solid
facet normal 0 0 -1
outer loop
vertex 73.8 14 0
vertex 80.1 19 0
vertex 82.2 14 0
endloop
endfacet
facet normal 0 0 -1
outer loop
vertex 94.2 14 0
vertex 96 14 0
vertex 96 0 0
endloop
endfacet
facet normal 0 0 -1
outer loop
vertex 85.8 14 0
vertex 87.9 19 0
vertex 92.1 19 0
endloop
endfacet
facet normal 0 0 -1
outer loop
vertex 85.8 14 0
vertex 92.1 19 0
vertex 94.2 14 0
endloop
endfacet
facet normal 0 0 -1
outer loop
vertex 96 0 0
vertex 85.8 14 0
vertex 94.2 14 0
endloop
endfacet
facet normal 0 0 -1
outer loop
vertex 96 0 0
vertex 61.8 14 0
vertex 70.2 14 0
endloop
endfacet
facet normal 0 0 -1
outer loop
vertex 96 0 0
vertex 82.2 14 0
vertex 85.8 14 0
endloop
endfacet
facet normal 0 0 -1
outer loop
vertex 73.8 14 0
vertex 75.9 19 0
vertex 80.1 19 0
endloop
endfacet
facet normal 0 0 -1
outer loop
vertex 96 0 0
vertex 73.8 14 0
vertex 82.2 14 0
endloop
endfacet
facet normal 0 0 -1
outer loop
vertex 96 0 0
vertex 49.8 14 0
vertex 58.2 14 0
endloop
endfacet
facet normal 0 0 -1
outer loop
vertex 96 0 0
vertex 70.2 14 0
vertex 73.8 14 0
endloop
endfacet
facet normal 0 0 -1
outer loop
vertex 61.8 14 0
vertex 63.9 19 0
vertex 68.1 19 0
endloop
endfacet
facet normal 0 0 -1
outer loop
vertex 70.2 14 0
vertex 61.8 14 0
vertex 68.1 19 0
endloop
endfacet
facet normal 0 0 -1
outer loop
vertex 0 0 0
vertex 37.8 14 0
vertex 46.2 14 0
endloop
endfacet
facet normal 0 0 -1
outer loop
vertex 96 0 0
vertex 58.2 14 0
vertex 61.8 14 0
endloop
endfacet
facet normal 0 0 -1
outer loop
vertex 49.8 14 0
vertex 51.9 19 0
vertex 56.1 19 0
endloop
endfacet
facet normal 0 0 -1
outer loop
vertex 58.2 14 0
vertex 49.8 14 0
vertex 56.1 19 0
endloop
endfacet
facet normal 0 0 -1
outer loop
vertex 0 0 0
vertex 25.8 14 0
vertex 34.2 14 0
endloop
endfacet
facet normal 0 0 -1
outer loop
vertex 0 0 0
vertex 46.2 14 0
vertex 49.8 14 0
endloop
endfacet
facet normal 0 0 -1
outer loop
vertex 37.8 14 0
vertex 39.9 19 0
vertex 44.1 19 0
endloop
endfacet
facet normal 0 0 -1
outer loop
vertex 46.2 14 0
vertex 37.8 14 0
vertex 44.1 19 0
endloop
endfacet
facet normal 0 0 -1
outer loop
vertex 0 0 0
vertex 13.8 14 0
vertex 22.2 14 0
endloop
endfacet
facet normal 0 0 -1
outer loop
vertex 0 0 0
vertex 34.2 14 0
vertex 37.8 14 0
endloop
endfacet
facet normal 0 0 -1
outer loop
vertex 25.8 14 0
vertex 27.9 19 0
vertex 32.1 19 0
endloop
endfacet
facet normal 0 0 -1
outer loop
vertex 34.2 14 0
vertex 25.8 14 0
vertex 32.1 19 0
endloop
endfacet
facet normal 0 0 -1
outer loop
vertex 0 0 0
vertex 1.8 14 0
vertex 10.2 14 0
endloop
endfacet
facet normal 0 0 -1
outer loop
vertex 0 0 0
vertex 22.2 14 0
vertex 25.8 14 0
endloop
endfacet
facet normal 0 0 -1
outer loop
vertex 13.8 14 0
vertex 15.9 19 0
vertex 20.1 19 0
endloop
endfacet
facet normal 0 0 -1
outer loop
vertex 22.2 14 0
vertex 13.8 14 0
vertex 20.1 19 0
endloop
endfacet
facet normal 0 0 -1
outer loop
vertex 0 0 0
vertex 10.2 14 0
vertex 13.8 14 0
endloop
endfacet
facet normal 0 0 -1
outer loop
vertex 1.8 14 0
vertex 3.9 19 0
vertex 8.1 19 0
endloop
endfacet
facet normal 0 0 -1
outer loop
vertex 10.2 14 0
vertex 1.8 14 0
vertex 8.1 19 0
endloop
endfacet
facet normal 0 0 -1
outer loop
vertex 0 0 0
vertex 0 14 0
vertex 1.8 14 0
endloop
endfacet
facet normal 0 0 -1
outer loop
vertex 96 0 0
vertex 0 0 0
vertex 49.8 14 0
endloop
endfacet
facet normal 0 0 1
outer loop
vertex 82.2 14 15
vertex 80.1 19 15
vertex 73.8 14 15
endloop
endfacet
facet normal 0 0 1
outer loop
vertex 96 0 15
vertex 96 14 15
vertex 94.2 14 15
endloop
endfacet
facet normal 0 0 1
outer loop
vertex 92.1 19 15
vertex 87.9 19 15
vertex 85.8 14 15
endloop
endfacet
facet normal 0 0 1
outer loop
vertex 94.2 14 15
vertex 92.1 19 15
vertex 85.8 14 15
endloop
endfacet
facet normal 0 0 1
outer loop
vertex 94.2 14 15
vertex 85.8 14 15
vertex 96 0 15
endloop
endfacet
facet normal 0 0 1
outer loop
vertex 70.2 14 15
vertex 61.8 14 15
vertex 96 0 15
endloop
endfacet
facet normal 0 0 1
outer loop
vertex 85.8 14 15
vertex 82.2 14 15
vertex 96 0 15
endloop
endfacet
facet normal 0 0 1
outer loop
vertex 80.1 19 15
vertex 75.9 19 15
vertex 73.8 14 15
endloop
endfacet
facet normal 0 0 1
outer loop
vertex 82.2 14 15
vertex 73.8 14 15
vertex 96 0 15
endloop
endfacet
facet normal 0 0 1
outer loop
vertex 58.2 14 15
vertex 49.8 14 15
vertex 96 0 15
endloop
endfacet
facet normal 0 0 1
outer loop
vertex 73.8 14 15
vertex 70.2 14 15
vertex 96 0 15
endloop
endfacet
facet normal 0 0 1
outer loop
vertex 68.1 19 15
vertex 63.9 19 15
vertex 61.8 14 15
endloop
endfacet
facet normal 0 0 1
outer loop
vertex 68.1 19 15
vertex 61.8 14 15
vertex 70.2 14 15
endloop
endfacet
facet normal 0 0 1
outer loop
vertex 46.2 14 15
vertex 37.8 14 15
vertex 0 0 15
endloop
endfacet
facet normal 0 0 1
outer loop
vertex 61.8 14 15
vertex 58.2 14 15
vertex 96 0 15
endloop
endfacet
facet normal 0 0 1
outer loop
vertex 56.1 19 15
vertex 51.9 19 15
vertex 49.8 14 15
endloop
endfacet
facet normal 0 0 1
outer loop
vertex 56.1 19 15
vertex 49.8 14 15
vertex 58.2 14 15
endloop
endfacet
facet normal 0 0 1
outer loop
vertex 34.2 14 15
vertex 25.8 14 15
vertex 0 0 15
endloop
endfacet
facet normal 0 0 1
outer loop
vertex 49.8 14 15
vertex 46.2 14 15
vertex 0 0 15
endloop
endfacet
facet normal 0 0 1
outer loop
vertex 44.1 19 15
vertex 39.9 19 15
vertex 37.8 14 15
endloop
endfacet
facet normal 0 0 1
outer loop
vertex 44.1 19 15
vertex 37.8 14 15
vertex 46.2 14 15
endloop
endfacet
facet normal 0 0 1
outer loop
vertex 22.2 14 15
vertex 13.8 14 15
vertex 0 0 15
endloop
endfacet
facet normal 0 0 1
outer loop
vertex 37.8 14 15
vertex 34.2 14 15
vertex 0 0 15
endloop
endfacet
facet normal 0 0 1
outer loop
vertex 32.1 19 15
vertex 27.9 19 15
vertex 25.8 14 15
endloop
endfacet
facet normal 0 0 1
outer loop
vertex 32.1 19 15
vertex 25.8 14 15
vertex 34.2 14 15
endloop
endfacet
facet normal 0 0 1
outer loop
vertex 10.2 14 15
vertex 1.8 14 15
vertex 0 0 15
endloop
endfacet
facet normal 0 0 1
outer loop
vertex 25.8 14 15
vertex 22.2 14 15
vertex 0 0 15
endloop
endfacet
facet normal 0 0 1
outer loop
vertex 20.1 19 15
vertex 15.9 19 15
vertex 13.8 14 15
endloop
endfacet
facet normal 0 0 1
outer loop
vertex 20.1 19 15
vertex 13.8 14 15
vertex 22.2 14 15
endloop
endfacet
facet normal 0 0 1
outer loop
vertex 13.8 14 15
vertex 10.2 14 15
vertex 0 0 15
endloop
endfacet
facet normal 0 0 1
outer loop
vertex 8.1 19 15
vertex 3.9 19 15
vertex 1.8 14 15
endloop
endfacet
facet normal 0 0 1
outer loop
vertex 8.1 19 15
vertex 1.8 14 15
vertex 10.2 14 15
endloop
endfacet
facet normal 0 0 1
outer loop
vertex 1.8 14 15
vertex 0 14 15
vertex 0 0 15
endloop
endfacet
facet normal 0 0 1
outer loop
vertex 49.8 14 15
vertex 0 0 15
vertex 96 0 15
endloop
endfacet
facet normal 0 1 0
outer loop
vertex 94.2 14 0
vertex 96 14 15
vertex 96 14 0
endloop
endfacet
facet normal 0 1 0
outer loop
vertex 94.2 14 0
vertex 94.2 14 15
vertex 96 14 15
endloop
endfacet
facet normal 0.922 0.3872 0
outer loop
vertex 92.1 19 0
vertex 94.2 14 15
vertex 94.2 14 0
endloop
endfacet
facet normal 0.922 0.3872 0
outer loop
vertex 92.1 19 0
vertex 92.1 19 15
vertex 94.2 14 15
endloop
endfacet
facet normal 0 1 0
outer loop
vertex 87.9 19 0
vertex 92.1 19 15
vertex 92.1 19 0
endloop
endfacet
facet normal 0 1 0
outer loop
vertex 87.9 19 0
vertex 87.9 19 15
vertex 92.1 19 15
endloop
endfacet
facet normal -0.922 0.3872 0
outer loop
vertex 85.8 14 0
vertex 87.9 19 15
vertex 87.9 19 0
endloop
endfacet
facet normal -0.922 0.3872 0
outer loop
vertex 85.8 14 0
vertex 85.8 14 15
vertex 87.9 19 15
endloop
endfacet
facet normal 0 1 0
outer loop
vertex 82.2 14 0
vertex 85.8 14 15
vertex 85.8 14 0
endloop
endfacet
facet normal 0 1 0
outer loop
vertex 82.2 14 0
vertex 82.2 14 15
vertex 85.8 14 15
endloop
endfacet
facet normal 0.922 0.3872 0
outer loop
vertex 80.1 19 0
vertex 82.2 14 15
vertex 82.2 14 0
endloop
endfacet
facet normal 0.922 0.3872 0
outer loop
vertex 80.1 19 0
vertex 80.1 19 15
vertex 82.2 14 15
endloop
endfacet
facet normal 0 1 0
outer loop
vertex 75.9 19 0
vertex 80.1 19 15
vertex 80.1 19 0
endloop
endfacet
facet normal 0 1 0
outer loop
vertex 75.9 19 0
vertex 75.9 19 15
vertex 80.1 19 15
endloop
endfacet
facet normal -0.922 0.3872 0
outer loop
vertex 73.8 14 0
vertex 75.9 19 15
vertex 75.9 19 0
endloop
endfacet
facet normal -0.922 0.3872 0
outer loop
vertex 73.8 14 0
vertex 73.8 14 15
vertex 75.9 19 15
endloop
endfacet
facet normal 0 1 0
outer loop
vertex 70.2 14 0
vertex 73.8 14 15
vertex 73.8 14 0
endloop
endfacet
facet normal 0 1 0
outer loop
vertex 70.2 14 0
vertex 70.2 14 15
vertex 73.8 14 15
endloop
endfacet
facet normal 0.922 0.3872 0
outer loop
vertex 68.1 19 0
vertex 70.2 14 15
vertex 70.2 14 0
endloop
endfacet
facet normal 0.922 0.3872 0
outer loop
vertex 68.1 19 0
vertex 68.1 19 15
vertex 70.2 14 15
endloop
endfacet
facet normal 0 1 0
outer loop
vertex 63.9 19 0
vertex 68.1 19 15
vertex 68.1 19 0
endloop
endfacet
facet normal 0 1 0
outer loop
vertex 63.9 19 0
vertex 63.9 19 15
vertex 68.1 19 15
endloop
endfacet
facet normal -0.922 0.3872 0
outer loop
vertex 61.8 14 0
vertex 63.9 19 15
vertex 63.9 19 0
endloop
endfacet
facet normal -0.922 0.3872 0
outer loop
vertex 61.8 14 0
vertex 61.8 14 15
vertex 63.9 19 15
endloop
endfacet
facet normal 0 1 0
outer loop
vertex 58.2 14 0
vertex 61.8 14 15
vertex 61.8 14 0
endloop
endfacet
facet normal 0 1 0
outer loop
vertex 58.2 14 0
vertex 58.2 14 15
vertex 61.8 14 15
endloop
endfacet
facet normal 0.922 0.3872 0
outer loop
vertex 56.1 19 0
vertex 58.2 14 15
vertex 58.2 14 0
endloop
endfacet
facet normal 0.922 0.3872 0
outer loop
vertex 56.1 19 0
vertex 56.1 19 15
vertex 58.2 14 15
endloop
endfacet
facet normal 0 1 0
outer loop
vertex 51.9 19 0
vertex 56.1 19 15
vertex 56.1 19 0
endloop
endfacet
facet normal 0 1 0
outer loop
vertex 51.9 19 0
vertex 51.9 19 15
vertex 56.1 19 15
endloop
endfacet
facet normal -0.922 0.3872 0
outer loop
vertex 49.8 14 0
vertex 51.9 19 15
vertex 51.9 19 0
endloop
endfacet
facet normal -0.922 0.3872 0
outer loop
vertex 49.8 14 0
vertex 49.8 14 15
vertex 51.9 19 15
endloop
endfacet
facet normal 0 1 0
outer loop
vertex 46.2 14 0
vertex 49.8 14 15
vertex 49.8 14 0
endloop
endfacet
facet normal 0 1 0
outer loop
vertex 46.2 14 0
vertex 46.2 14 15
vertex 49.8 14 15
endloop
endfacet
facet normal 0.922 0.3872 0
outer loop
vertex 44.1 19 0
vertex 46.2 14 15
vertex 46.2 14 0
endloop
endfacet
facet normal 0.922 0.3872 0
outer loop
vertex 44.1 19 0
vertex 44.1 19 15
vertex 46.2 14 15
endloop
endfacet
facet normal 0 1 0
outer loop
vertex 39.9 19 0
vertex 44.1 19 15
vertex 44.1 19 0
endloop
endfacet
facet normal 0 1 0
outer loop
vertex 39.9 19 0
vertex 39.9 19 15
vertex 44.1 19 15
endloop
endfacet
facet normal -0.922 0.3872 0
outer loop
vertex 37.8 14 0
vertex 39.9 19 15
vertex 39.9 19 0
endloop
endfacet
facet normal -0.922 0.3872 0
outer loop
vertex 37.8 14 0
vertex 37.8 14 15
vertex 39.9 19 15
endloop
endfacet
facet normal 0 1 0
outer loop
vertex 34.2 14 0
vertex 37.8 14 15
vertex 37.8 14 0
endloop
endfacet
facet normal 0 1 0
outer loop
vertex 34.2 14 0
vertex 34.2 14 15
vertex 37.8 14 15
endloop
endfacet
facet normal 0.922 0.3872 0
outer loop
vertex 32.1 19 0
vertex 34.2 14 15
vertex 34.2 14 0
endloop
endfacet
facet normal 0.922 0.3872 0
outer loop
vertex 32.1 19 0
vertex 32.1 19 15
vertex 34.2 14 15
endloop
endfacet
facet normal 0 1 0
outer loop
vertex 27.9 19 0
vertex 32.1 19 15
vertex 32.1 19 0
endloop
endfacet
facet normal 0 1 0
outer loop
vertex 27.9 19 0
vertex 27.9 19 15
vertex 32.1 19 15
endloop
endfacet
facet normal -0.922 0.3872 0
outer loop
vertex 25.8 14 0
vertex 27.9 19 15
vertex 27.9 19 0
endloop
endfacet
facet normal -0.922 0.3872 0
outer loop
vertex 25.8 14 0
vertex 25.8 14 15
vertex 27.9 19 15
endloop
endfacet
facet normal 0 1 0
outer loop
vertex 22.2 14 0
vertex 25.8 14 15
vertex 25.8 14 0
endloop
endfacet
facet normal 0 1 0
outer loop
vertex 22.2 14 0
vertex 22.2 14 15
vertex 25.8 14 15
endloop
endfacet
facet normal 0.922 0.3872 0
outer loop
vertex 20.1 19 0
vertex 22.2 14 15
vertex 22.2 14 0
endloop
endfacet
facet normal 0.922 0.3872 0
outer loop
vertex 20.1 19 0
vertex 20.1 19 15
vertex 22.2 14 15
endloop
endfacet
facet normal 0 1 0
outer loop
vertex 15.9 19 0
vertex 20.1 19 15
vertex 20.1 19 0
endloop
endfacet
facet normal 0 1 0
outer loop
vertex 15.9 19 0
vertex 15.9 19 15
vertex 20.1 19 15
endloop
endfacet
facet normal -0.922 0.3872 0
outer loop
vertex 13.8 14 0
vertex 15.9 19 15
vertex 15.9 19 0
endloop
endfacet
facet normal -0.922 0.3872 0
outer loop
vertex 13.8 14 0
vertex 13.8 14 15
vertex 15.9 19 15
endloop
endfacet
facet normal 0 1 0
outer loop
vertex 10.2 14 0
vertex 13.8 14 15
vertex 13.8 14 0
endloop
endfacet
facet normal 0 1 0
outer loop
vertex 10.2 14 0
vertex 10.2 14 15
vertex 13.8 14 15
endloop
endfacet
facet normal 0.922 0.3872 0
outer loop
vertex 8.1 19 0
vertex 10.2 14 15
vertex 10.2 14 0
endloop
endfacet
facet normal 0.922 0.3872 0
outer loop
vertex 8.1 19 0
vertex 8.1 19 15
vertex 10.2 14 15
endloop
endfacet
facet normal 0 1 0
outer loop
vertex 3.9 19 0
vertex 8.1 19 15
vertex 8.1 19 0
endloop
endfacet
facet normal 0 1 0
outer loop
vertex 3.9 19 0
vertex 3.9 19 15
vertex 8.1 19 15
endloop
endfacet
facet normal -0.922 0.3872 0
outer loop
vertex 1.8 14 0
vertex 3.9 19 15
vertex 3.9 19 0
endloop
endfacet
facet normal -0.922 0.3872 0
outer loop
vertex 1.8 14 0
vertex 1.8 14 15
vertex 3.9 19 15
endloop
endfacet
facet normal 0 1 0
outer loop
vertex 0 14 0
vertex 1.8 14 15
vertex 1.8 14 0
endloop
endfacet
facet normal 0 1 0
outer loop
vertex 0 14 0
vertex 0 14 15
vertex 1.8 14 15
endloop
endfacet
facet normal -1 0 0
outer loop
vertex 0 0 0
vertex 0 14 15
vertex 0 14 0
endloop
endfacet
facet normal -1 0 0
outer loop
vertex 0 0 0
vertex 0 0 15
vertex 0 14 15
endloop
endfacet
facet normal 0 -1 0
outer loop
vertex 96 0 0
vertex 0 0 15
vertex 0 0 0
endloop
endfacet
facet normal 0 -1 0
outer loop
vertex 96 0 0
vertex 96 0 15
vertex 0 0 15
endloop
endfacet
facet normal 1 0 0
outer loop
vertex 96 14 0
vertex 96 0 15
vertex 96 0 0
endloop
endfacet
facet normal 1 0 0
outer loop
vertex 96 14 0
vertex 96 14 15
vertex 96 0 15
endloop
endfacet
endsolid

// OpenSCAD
$fn = 32;

// ----------------------------------------------------------------------
// Gear rack: 8 teeth, pitch 12 mm
// ----------------------------------------------------------------------

// --- parameters (mm) ---
teeth = 8;                // number of teeth
pitch = 12;               // tooth pitch, X
root_w = 8.4;             // tooth width at the root
tip_w = 4.2;              // tooth width at the tip
base_h = 14;              // rack body height, Y
tooth_h = 5;              // tooth height above the body
plate_t = 15;             // rack width, Z (extrusion height)

rack_l = teeth * pitch;  // overall length
total_h = base_h + tooth_h;  // overall height

profile = [[0, 0], [96, 0], [96, 14], [94.2, 14], [92.1, 19], [87.9, 19], [85.8, 14], [82.2, 14], [80.1, 19], [75.9, 19], [73.8, 14], [70.2, 14], [68.1, 19], [63.9, 19], [61.8, 14], [58.2, 14], [56.1, 19], [51.9, 19], [49.8, 14], [46.2, 14], [44.1, 19], [39.9, 19], [37.8, 14], [34.2, 14], [32.1, 19], [27.9, 19], [25.8, 14], [22.2, 14], [20.1, 19], [15.9, 19], [13.8, 14], [10.2, 14], [8.1, 19], [3.9, 19], [1.8, 14], [0, 14]];  // primary outline, 36 points, counter clockwise

// --- the one profile operation ---
linear_extrude(height = plate_t) polygon(points = profile);
